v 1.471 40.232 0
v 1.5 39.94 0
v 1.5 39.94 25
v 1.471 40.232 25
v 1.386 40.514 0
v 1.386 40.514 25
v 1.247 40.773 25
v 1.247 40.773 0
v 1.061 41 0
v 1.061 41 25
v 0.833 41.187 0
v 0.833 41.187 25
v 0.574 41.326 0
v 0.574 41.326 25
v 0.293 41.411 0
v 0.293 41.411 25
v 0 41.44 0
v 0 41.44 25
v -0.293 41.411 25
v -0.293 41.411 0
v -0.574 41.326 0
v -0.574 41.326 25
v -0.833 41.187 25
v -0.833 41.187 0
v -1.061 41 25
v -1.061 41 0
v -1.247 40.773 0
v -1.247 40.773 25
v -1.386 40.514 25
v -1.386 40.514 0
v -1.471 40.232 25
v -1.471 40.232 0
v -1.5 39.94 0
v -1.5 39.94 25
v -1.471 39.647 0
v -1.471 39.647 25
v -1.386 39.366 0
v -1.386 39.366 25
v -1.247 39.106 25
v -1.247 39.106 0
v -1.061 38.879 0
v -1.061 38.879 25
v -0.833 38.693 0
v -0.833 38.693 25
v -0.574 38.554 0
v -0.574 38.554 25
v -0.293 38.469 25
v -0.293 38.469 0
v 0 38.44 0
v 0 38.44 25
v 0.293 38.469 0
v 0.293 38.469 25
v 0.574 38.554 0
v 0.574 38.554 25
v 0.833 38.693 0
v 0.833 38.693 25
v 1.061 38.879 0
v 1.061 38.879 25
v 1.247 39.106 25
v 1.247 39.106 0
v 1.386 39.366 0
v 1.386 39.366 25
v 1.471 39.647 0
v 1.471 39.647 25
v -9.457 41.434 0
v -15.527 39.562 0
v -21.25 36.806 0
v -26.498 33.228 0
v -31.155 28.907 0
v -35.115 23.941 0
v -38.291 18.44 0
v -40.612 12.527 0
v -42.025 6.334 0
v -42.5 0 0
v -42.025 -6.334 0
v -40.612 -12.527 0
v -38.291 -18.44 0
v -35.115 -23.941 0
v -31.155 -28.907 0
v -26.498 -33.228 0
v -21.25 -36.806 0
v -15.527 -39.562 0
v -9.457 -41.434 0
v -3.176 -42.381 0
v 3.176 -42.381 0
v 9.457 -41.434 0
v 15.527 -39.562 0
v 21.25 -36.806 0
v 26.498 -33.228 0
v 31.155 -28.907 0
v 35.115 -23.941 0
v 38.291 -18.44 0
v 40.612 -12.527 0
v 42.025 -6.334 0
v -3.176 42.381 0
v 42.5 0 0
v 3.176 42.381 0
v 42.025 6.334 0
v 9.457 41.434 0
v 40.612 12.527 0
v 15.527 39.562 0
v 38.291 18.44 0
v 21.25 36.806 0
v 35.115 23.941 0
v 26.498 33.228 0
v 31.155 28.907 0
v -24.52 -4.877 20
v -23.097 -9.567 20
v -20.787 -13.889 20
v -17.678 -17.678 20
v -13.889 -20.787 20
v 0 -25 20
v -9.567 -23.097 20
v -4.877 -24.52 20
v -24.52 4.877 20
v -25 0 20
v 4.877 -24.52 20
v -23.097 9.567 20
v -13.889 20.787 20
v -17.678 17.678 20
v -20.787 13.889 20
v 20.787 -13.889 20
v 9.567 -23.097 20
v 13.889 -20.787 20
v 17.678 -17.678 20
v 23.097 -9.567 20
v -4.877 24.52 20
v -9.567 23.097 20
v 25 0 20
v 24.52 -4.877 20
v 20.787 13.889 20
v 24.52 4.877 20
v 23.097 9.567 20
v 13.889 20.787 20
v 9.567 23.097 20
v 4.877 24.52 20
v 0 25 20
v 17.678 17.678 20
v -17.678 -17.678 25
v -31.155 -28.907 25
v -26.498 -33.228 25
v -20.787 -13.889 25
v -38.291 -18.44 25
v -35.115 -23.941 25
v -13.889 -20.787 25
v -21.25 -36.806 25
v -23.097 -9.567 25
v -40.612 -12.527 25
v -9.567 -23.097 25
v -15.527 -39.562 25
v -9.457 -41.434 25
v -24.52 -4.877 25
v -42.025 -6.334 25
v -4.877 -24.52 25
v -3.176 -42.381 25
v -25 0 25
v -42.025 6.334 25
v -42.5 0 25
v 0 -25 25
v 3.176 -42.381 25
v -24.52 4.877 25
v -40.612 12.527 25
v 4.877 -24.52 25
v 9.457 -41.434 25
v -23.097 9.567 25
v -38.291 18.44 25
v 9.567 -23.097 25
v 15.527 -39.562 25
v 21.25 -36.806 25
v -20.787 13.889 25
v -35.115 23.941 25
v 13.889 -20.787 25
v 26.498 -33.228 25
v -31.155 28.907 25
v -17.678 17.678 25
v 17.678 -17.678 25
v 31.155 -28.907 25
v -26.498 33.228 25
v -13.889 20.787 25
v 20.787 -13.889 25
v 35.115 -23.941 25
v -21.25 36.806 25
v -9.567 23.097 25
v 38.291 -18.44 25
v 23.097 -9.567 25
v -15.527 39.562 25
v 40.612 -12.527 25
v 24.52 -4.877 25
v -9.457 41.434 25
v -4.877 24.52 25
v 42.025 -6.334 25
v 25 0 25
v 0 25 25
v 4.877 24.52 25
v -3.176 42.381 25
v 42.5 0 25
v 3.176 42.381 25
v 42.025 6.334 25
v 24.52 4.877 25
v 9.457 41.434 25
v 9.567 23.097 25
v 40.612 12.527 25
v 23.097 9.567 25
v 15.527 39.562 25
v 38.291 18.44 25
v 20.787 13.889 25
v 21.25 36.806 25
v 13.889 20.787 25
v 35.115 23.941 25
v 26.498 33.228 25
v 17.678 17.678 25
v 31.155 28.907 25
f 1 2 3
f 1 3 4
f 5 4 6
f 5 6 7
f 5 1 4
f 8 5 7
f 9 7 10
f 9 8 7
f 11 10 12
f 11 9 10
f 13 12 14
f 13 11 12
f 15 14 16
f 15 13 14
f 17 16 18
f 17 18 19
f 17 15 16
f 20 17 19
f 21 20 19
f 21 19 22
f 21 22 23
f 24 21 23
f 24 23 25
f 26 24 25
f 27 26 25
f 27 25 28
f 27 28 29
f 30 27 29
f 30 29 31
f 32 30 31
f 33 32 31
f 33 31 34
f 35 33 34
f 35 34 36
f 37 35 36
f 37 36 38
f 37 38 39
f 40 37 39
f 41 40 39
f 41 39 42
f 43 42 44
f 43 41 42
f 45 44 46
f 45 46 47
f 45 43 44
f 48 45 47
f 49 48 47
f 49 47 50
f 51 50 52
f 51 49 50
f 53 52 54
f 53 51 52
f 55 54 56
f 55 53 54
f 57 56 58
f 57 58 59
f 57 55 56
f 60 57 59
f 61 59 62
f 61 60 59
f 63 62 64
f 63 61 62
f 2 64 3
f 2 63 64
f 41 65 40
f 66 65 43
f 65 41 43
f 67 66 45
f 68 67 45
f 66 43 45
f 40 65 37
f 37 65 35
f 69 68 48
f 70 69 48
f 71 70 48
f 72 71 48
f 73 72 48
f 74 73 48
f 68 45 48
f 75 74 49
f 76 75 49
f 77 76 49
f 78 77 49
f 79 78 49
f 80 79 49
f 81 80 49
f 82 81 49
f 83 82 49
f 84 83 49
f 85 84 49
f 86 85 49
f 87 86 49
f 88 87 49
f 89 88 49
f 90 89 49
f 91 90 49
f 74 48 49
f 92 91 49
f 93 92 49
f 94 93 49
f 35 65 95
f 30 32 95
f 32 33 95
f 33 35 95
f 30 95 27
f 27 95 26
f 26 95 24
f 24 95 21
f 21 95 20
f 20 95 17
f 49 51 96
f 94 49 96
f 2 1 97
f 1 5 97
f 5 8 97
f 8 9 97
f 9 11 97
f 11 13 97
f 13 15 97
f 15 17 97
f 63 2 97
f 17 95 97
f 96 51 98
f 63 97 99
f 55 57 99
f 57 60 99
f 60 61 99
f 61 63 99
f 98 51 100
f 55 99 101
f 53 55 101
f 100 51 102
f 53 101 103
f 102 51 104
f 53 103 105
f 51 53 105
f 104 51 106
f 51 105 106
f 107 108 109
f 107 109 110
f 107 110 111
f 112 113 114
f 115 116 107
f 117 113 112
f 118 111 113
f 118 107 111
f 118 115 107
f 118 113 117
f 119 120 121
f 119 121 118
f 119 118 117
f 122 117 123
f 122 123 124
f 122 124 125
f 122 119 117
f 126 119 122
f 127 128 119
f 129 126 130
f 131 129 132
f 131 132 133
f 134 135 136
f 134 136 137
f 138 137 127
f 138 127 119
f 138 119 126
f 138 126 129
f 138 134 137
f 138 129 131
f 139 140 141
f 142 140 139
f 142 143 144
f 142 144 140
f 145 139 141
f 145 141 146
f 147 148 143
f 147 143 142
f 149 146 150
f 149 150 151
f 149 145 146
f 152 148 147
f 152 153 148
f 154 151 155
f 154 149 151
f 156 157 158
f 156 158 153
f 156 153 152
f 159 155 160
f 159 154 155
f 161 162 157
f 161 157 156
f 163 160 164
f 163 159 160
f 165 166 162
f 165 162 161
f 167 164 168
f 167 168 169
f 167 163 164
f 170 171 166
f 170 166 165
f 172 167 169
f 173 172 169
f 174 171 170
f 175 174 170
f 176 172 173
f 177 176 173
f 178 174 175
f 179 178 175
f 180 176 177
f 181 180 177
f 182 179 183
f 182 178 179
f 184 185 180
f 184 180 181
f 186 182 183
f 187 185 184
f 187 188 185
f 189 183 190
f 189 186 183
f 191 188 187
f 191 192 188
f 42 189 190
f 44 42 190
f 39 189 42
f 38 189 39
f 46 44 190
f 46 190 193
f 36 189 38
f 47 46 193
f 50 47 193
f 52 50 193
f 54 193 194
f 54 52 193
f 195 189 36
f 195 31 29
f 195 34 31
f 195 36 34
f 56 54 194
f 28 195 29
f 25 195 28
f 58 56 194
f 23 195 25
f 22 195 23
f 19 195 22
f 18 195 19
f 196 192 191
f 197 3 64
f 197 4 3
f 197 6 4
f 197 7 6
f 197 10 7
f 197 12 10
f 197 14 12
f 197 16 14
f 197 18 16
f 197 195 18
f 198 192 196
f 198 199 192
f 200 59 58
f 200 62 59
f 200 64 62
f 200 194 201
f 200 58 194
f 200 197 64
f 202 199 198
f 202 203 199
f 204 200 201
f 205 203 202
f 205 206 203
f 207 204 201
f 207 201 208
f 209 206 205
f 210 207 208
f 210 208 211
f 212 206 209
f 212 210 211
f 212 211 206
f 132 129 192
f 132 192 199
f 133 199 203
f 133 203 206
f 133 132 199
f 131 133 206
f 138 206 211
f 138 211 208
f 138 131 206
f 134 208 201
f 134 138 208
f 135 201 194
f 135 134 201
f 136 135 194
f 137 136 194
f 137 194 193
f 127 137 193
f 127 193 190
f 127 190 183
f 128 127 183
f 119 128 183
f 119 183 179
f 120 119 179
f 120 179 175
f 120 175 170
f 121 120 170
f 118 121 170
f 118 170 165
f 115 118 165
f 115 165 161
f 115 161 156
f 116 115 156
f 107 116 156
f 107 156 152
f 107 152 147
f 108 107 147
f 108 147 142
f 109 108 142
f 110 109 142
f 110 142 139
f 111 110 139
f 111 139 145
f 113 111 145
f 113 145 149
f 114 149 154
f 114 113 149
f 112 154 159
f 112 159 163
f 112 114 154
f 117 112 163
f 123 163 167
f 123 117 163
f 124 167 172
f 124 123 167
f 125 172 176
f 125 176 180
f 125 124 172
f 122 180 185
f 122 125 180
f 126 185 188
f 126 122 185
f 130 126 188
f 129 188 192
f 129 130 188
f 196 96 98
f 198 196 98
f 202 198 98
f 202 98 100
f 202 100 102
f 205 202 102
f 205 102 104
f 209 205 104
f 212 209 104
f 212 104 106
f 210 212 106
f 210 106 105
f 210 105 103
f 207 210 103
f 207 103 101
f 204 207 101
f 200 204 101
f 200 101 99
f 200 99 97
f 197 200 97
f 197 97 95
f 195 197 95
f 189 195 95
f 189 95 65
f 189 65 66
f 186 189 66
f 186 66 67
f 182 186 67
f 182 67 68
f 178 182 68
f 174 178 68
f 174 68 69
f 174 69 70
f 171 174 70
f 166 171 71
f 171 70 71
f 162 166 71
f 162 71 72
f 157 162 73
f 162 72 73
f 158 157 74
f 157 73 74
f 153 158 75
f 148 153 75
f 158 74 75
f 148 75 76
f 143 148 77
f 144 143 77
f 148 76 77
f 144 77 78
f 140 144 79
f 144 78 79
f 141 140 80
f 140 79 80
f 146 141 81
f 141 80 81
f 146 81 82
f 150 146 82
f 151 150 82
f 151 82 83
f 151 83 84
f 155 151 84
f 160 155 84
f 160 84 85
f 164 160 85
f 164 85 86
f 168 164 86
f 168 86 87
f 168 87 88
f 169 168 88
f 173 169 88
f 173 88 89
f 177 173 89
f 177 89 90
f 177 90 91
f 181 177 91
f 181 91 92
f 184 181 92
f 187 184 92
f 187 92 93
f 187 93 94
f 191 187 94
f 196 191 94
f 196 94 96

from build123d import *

# Parameters (mm, degrees)
F0_R     = 42.5
F0_R_2   = 25
F0_R_3   = 1.5
F1_DEPTH = 5
F2_DEPTH = 20
F3_DEPTH = 25


with BuildPart() as f1:
    # F0 (on Top) → F1 (new body)
    with BuildSketch(Plane.XY):
        Circle(F0_R)
        Circle(F0_R_2, mode=Mode.SUBTRACT)
        with Locations((0, 39.939713)):
            Circle(F0_R_3, mode=Mode.SUBTRACT)
        Circle(F0_R_2)
    extrude(amount=F1_DEPTH)

    # F0 (on Top) → F2 (join)
    with BuildSketch(Plane.XY):
        Circle(F0_R_2)
    extrude(amount=F2_DEPTH)

    # F0 (on Top) → F3 (join)
    with BuildSketch(Plane.XY):
        Circle(F0_R)
        Circle(F0_R_2, mode=Mode.SUBTRACT)
        with Locations((0, 39.939713)):
            Circle(F0_R_3, mode=Mode.SUBTRACT)
    extrude(amount=F3_DEPTH)


solid = f1.part
